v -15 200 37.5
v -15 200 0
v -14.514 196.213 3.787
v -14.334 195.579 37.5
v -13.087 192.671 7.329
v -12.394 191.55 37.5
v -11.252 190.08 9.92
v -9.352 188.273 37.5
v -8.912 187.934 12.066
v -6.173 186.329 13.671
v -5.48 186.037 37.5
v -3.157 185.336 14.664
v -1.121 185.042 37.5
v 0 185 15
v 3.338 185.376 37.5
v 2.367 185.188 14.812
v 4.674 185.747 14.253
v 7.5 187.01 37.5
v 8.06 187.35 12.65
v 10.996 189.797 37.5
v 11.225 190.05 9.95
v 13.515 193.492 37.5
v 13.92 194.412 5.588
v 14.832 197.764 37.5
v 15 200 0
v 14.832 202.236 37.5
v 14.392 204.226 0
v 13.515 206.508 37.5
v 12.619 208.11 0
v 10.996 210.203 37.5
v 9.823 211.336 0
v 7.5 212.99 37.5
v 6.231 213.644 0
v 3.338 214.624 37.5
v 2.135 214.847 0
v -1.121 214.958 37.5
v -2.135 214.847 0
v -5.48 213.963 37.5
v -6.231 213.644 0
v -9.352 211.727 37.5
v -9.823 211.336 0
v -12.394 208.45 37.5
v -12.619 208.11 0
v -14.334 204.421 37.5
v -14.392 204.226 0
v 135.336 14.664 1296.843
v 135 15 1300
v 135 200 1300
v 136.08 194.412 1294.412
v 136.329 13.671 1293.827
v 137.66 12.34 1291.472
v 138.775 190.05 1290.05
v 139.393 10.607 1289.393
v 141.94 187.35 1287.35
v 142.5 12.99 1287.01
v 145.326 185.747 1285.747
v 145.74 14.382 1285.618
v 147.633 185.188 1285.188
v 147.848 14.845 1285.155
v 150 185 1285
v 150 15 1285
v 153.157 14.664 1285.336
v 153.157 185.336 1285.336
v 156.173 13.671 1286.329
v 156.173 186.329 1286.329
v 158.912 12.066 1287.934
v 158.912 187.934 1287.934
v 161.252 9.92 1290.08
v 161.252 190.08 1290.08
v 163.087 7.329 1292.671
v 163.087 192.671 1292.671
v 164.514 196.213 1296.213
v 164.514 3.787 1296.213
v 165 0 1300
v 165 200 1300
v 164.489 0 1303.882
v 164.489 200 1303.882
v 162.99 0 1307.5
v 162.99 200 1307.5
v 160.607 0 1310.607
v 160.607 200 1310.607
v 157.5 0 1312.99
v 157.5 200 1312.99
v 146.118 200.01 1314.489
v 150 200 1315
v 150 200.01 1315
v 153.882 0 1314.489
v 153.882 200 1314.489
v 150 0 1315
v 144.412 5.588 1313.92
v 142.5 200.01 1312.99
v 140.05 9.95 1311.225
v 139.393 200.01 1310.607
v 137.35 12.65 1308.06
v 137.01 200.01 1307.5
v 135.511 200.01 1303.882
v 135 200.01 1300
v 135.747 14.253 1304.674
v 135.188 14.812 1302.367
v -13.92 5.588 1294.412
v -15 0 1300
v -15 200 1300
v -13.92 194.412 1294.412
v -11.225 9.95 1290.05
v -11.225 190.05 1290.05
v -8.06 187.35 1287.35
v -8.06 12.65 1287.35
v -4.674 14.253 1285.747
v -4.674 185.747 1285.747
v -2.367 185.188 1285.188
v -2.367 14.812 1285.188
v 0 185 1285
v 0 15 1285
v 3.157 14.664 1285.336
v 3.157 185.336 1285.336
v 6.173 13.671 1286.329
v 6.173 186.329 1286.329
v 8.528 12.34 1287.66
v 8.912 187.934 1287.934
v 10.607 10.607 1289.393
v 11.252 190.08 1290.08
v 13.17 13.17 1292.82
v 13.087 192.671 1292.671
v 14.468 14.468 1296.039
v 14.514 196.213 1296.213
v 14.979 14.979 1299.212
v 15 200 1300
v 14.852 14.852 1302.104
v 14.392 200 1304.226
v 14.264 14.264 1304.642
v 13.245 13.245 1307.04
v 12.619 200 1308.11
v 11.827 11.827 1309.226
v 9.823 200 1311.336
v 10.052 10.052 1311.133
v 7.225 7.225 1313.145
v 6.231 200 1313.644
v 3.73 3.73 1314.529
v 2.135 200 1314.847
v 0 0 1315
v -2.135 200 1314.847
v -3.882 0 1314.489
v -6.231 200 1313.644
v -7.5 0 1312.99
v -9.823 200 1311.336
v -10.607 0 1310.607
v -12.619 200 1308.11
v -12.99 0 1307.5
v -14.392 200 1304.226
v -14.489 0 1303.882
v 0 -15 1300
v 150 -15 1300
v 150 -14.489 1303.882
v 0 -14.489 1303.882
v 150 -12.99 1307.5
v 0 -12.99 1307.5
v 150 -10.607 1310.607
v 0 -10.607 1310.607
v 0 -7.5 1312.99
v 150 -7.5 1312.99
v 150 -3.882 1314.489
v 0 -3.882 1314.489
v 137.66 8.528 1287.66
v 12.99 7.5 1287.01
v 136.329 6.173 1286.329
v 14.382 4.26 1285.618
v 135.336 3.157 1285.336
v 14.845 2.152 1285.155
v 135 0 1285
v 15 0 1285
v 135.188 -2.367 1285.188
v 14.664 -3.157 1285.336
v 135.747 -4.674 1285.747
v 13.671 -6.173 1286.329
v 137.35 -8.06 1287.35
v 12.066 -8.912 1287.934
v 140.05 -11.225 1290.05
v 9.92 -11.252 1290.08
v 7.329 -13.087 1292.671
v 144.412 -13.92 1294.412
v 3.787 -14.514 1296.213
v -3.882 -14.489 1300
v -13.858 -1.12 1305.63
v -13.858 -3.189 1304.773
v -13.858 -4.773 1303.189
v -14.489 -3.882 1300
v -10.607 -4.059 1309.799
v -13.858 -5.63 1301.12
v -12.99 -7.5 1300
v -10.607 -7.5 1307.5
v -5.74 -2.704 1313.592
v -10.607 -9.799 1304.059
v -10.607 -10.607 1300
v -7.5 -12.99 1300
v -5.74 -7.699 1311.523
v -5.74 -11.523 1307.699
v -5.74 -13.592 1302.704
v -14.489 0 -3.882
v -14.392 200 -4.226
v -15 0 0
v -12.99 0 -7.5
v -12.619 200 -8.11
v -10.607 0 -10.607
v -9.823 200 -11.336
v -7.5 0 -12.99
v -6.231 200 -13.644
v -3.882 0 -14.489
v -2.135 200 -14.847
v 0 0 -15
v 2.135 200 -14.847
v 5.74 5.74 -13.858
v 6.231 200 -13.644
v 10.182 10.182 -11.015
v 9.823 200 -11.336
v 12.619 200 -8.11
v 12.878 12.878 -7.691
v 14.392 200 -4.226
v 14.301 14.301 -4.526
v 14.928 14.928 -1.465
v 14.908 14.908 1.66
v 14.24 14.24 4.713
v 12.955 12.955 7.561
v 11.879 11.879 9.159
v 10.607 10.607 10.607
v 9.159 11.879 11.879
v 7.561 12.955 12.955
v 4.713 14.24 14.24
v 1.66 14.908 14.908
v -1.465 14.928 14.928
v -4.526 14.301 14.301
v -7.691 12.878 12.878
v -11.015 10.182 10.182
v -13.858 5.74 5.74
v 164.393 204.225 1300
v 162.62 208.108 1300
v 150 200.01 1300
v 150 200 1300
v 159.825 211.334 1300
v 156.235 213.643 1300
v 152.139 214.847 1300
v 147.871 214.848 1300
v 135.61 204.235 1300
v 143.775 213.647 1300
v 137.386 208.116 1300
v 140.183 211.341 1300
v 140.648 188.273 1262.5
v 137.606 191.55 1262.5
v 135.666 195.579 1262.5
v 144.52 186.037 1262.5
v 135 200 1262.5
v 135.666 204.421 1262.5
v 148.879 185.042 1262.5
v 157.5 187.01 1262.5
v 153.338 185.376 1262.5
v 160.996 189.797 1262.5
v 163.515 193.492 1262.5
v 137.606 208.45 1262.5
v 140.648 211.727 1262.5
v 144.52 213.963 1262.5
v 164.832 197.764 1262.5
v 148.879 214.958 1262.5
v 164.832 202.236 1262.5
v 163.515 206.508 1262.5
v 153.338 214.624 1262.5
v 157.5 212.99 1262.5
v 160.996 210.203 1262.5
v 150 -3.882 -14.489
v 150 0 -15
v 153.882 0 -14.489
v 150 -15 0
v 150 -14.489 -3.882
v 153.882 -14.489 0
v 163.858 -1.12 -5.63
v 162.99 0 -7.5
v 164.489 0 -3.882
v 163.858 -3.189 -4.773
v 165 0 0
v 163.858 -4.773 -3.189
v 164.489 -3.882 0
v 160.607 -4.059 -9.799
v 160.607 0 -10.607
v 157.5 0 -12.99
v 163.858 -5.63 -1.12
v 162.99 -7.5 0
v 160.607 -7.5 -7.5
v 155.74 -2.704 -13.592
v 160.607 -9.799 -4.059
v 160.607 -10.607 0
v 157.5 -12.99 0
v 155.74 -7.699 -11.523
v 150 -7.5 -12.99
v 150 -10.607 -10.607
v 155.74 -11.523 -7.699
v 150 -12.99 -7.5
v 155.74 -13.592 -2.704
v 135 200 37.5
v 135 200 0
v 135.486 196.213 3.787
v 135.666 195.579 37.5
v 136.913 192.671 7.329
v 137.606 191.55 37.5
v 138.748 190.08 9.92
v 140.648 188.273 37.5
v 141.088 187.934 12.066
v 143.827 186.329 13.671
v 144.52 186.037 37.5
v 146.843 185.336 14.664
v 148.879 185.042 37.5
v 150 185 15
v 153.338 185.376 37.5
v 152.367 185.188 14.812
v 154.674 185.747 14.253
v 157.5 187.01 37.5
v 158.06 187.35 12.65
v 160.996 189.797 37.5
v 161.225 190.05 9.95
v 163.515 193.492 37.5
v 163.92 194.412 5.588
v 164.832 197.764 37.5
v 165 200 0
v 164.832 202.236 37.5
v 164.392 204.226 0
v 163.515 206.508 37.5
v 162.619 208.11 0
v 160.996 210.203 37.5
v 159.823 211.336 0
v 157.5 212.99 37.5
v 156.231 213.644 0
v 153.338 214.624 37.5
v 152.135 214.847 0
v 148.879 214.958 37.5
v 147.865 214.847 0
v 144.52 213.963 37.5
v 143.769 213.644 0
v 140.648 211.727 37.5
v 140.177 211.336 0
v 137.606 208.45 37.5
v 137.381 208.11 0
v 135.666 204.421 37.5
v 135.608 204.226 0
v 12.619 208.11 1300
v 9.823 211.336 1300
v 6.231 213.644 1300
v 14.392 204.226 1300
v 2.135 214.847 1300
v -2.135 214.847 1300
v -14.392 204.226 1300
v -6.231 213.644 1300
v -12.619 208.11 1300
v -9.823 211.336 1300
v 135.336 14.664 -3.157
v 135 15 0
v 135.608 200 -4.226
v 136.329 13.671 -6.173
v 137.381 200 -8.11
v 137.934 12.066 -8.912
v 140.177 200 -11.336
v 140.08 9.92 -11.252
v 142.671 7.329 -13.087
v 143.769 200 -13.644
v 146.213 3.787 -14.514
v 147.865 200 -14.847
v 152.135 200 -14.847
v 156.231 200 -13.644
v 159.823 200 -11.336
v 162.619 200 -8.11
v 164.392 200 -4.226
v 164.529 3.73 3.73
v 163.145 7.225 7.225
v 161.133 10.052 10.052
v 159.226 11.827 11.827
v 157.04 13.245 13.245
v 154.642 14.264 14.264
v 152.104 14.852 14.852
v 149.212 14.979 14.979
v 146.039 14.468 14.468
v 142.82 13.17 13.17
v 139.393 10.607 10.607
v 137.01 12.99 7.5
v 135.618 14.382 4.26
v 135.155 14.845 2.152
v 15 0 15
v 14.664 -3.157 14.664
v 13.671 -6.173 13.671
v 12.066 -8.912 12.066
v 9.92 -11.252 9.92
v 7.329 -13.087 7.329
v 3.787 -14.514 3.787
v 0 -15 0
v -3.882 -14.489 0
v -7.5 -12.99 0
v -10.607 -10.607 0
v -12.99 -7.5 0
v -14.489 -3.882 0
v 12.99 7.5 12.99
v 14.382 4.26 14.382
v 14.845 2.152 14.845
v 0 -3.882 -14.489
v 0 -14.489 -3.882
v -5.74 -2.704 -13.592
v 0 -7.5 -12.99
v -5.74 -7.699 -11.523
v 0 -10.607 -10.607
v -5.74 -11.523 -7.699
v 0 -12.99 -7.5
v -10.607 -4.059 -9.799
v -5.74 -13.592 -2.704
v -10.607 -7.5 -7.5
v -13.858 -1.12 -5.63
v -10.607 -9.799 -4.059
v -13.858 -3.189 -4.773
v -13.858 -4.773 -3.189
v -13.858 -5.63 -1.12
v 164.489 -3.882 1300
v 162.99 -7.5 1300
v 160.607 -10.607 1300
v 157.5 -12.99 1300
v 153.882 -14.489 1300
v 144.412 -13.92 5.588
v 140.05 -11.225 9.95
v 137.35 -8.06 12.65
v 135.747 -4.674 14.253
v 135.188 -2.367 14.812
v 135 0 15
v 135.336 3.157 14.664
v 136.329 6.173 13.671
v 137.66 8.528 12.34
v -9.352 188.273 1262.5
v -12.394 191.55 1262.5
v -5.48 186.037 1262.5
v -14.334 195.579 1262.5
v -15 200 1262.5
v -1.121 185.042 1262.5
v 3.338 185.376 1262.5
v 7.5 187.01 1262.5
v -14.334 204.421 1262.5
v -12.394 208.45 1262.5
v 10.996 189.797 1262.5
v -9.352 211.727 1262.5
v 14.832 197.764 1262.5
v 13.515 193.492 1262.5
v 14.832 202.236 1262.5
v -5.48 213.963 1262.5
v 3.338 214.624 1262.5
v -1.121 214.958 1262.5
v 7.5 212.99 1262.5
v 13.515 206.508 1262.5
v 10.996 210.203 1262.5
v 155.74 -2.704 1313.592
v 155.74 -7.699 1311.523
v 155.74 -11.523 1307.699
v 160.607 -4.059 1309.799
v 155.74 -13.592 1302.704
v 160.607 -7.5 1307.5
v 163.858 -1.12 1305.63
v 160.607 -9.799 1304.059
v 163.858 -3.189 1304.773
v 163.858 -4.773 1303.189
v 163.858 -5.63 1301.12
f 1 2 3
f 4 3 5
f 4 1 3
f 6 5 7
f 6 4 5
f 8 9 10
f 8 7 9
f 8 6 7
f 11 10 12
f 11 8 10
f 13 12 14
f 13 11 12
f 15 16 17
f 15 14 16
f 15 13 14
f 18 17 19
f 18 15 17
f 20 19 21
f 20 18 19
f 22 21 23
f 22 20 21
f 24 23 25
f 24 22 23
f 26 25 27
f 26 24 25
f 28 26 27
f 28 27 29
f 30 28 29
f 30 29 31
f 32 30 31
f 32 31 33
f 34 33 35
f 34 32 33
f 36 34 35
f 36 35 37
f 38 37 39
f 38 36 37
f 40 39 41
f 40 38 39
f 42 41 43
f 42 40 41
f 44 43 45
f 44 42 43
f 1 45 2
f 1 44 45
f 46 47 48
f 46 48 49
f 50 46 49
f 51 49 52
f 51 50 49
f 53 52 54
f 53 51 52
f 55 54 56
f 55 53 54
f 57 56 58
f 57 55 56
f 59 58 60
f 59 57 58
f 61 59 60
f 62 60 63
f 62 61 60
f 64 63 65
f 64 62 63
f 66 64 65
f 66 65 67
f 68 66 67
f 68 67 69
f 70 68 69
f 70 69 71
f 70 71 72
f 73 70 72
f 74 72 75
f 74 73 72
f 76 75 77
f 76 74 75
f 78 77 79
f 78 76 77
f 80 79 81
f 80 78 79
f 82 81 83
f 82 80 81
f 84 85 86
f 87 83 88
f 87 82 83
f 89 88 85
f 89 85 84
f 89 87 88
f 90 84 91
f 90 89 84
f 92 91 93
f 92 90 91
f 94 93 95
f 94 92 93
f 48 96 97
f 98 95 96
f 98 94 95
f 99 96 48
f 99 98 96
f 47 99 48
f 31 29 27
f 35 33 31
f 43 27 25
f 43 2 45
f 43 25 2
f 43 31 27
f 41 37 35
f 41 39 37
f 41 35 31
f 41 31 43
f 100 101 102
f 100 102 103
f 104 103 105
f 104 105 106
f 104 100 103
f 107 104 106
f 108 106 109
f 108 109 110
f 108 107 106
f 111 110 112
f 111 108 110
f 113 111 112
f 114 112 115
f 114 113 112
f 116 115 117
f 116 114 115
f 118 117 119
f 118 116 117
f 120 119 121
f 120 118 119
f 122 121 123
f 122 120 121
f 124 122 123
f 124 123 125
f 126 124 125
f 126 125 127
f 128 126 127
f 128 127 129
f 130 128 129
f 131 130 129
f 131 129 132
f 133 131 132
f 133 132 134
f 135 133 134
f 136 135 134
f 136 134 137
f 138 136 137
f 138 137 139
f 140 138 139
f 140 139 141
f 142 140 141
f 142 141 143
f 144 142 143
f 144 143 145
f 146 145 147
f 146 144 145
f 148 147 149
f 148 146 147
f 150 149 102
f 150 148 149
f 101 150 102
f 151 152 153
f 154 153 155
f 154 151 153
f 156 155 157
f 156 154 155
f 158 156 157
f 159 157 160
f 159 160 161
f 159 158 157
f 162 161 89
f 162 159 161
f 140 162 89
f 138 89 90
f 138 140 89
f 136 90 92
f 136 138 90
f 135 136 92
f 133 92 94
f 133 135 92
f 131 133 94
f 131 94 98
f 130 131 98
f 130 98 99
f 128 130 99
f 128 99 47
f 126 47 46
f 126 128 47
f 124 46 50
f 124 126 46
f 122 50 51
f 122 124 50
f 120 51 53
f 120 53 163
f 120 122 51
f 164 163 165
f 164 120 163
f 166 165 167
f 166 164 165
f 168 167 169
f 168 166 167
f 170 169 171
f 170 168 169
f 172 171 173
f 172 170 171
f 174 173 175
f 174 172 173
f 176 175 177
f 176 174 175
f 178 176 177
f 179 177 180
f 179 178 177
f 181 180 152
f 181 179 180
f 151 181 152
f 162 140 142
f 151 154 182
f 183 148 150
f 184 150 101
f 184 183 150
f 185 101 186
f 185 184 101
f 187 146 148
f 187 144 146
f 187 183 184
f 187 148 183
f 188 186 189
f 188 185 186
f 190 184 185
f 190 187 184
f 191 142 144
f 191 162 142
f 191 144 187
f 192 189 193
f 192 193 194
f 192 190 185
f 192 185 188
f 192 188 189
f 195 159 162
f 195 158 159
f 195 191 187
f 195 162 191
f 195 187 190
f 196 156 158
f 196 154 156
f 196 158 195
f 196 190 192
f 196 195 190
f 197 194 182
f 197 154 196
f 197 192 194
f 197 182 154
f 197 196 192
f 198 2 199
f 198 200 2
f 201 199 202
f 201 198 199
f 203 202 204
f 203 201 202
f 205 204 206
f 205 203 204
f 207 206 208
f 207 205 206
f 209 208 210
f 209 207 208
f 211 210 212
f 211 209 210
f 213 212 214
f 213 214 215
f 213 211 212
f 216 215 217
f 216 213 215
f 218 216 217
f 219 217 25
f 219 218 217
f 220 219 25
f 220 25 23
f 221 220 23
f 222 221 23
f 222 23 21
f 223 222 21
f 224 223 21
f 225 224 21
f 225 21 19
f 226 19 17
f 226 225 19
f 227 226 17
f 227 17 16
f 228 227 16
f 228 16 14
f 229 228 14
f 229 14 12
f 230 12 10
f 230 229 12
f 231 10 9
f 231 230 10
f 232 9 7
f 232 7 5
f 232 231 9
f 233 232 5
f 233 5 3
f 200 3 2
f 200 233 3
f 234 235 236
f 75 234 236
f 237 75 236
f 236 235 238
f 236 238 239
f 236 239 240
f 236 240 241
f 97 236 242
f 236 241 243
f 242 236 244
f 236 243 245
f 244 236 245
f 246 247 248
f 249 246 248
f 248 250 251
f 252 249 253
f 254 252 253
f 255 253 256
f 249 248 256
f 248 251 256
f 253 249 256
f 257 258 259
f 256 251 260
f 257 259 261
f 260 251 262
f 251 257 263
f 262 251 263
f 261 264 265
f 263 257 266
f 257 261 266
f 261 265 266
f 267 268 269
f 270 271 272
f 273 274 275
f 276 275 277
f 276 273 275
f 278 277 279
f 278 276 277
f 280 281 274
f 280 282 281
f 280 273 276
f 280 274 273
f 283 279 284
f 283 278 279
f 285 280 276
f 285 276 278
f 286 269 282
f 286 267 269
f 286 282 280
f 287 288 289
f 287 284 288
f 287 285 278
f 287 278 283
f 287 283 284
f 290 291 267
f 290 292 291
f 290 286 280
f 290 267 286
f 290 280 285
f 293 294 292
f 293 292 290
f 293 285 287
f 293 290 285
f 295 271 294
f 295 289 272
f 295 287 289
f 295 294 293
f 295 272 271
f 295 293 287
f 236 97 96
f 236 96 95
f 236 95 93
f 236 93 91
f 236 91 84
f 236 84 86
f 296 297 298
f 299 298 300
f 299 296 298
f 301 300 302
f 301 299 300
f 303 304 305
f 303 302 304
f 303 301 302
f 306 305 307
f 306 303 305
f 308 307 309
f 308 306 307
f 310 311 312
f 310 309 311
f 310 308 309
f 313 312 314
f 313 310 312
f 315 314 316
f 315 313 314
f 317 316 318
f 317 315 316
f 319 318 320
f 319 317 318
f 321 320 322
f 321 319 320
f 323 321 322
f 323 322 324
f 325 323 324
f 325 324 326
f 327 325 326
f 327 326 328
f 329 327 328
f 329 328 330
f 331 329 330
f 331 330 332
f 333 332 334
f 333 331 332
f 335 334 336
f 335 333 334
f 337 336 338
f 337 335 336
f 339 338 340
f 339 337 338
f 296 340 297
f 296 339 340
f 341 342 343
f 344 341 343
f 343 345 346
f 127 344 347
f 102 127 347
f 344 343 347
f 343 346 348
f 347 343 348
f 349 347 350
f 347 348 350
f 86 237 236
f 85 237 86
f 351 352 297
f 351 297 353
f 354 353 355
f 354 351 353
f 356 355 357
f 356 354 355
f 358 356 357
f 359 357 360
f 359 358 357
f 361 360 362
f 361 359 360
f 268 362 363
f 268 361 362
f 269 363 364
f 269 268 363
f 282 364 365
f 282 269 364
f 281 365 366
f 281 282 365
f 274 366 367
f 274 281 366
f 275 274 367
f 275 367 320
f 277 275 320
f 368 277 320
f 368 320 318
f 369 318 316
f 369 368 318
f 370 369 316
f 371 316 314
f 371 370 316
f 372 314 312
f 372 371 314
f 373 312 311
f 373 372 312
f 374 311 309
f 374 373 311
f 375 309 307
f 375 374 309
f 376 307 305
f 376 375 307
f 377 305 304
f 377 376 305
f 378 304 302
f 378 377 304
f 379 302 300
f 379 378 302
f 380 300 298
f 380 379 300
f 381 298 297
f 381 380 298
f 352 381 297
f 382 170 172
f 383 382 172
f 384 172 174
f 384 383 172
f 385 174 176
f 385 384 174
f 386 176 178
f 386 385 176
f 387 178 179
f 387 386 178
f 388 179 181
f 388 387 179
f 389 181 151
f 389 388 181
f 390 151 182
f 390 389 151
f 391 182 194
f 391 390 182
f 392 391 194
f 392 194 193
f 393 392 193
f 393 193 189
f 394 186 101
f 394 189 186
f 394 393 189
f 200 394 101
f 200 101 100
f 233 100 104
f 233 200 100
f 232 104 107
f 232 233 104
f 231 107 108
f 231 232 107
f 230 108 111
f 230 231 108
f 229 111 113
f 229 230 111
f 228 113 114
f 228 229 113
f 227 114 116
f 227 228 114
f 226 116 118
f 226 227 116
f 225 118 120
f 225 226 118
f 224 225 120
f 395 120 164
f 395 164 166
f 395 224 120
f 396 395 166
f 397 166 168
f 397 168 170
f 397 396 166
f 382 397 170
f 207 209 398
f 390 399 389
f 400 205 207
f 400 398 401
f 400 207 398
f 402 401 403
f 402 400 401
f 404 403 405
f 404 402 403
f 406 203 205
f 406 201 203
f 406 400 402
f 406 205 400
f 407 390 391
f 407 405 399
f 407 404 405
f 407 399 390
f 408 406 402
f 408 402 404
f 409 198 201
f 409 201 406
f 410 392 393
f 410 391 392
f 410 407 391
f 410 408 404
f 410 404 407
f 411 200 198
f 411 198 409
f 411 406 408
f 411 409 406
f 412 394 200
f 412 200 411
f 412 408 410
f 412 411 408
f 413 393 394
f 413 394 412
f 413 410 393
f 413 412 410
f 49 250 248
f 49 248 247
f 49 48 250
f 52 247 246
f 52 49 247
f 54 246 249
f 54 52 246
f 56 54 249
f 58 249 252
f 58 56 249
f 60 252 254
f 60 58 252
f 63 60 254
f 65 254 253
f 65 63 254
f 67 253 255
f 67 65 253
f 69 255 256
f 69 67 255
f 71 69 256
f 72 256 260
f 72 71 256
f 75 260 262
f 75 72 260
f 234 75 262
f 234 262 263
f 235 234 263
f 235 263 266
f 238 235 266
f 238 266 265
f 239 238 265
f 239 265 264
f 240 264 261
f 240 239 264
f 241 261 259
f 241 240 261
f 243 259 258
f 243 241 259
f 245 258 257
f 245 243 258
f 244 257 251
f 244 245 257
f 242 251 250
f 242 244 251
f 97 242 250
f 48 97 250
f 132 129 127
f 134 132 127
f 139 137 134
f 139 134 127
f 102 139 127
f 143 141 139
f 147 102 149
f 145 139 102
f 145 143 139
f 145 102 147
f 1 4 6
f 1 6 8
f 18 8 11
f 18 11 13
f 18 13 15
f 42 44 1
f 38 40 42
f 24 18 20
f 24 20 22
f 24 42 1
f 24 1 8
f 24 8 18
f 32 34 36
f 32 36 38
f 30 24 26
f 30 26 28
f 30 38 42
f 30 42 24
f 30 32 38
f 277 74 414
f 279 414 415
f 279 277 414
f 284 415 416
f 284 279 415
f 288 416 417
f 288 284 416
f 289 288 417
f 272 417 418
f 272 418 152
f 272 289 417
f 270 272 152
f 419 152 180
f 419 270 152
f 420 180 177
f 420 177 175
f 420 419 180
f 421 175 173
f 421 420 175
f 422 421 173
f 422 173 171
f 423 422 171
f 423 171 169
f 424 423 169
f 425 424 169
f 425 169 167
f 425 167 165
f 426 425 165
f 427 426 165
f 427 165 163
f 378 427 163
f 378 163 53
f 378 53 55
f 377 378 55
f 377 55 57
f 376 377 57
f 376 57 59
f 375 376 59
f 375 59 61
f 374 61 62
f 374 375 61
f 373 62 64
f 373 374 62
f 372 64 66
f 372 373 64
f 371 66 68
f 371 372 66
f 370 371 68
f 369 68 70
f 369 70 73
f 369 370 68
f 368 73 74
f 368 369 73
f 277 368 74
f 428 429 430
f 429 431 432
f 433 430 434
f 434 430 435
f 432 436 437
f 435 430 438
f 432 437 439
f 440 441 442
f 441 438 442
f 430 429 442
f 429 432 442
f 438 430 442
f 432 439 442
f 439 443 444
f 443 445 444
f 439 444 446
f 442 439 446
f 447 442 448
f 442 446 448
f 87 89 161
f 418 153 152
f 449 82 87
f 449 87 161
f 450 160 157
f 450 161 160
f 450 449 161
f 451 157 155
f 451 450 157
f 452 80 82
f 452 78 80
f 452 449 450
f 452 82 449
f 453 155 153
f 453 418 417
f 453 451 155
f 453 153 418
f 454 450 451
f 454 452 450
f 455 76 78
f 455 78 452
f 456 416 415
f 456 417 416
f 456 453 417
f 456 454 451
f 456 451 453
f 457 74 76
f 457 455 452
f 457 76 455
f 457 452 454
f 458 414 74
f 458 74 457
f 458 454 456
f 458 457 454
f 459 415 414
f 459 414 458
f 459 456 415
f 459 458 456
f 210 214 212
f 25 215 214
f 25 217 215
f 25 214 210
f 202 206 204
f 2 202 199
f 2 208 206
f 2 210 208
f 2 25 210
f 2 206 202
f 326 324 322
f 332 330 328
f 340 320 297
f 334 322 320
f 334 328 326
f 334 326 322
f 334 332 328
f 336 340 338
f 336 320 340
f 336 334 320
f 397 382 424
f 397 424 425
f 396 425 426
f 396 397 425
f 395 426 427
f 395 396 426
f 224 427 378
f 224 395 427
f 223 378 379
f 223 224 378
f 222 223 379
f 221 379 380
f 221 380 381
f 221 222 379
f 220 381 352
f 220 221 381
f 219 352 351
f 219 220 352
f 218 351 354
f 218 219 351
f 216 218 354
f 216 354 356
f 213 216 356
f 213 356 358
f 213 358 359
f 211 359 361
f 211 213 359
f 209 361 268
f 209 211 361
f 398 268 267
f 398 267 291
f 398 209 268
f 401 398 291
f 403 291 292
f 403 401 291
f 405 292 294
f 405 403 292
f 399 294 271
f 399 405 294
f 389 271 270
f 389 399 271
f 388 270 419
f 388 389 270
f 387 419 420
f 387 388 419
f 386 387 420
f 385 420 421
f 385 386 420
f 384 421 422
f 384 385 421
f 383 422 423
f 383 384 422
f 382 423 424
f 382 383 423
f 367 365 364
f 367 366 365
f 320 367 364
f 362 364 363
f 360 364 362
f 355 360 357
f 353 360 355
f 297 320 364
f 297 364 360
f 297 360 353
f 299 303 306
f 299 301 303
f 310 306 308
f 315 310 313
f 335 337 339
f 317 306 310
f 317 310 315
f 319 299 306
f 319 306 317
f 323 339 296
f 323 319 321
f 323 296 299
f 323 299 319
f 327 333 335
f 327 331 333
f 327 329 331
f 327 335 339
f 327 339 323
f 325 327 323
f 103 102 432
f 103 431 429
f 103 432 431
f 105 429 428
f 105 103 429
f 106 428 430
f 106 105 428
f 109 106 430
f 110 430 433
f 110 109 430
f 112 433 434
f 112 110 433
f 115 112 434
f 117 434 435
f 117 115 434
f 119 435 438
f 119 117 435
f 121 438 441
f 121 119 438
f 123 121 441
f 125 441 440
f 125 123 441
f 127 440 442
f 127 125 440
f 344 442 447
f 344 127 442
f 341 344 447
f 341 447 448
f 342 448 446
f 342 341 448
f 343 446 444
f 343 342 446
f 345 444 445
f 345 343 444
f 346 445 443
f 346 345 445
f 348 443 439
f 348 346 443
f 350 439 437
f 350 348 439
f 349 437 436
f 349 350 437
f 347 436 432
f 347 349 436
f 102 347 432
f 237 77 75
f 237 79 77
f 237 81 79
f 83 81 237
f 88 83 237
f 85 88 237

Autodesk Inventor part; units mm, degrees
sketch "Sketch1" plane through (0, 0, 0) normal (0, 0, 1) x (1, 0, 0)
  circle A0 centre (0, 0) radius 15
  circle A1 centre (150, 0) radius 15
  line L0 (0, 0) -> (150, 0)
  dimension "d0" = 30
  dimension "d3" = 30
  dimension "d4" = 150
extrude "Extrusion1" add sketch "Sketch1" along normal blind 1300
sketch "Sketch2" plane through (0, 0, 0) normal (0, 1, 0) x (-1, 0, 0)
  line L0 (15, 1300) -> (-15, 1300) projected
  line L1 (-15, 0) -> (15, 0) projected
  line L2 (-135, 1300) -> (-165, 1300) projected
  line L3 (-165, 0) -> (-135, 0) projected
  circle A0 centre (0, 0) radius 15
  line L4 (-165, 0) -> (-135, 0) projected
  circle A1 centre (-150, 0) radius 15
  line L5 (15, 1300) -> (-15, 1300) projected
  circle A2 centre (0, 1300) radius 15
  line L6 (-135, 1300) -> (-165, 1300) projected
  circle A3 centre (-150, 1300) radius 15
extrude "Extrusion2" add sketch "Sketch2" along normal blind 200
sketch "Sketch3" plane through (0, 0, 1300) normal (0, 0, 1) x (1, 0, 0)
  line L0 (135, 0) -> (165, 0) projected
  line L1 (165, 0) -> (135, 0) projected
  arc A0 (135, 0) -> (165, 0) centre (150, 0) ccw projected
  line L2 (15, 0) -> (-15, 0) projected
  arc A1 (-15, 0) -> (15, 0) centre (0, 0) ccw projected
  circle A2 centre (150, 0) radius 15
  line L3 (165, 0) -> (135, 0)
  circle A3 centre (0, 0) radius 15
  line L4 (15, 0) -> (-15, 0)
revolve "Revolution1" add sketch "Sketch3" angle 90 about axis through (135, 0, 1300) along (-1, 0, 0) contours L0 A0 | A1 L2
sketch "Sketch4" plane through (0, 0, 0) normal (0, 0, -1) x (-1, 0, 0)
  line L0 (15, 0) -> (-15, 0) projected
  arc A0 (-15, 0) -> (15, 0) centre (0, 0) ccw projected
  line L1 (-135, 0) -> (-165, 0) projected
  arc A1 (-165, 0) -> (-135, 0) centre (-150, 0) ccw projected
  circle A2 centre (0, 0) radius 15
  circle A3 centre (-150, 0) radius 15
  line L2 (-165, 0) -> (-135, 0)
  line L3 (15, 0) -> (-15, 0)
revolve "Revolution2" add sketch "Sketch4" angle 90 about axis through (-15, 0, 0) along (1, 0, 0) contours A0 L0 | A1 L1
sketch "Sketch5" plane through (150, 200, 1300) normal (0, 1, 0) x (1, 0, 0)
  circle A0 centre (0, 0) radius 15 projected
  circle A1 centre (0, 0) radius 15
  line L0 (-15, 0) -> (0, 0)
  line L1 (0, 0) -> (0, -15)
  point P0 (-150, 1300)
  point P1 (15, 0)
extrude "Extrusion4" add sketch "Sketch5" along normal blind 0.01 contours L0 L1 A0 picked at (-1.1126, -9.8746)
ref_plane "Work Plane1" through (150, 200.01, 1300) normal (0, 0, -1) x (-1, 0, 0)
sketch "Sketch6" plane through (150, 200.01, 1300) normal (0, 0, -1) x (-1, 0, 0)
  line L0 (15, -0.01) -> (-15, -0.01) projected
  line L1 (165, -0.01) -> (135, -0.01) projected
  circle A0 centre (150, -0.01) radius 15
  circle A1 centre (0, -0.01) radius 15
  point P0 (150, -200.01)
extrude "Extrusion5" add sketch "Sketch6" along normal blind 1300
ref_plane "Work Plane2" through (150, 200.01, 650) normal (0, 0, 1) x (1, 0, 0)
sketch "Sketch7" plane through (150, 200.01, 650) normal (0, 0, 1) x (1, 0, 0)
  arc A0 (15, -0.01) -> (-15, -0.01) centre (0, -0.01) ccw projected
  arc A1 (-15, -0.01) -> (15, -0.01) centre (0, -0.01) ccw projected
  line L0 (15, -0.01) -> (-15, -0.01) projected
  arc A2 (15, -200.01) -> (-15, -200.01) centre (0, -200.01) ccw projected
  line L1 (-15, -200.01) -> (15, -200.01) projected
  circle A3 centre (0, -0.01) radius 15
  line L2 (-165, -0.01) -> (-135, -0.01) projected
  arc A4 (-135, -0.01) -> (-165, -0.01) centre (-150, -0.01) ccw projected
  arc A5 (-165, -0.01) -> (-135, -0.01) centre (-150, -0.01) ccw projected
  line L3 (-135, -0.01) -> (-165, -0.01) projected
  arc A6 (-135, -200.01) -> (-165, -200.01) centre (-150, -200.01) ccw projected
  line L4 (-165, -200.01) -> (-135, -200.01) projected
  circle A7 centre (-150, -0.01) radius 15
extrude "Extrusion6" cut sketch "Sketch7" along normal mid plane 1225 contours L0 A0 | A1 L0 | A4 L2 | L2 A5
ref_plane "Work Plane3" through (0, 0, -10) normal (-1, 0, 0) x (0, 0, 1)
sketch "Sketch8" plane through (0, 0, -10) normal (-1, 0, 0) x (0, 0, 1)
  line L0 (1310, 0) -> (1310, 0) projected
  line L1 (1310, 0) -> (1310, 0) projected
  line L2 (10, 0) -> (10, 0) projected
  line L3 (10, 0) -> (10, 0) projected
  line L4 (10, 200) -> (10, 200) projected
  line L5 (10, 200) -> (10, 200) projected
  line L6 (10, 0) -> (10, 0) projected
  line L7 (10, 0) -> (10, 0) projected
  line L8 (25, 15) -> (1295, 15) projected
  line L9 (10, -15) -> (1310, -15) projected
  line L10 (10, 0) -> (10, -15) projected
  line L11 (10, 0) -> (25, 15) projected
  line L12 (25, 15) -> (25, 185) projected
  line L13 (-5, 0) -> (-5, 200) projected
  line L14 (-5, 0) -> (10, 0) projected
  line L15 (1295, 15) -> (1310, 0) projected
  line L16 (1310, 0) -> (1325, 0) projected
  line L17 (1310, -15) -> (1310, 0) projected
  line L18 (1325, 0) -> (1325, 200) projected
  line L19 (1295, 15) -> (1295, 185) projected
  arc A0 (1310, -15) -> (1325, 0) centre (1310, 0) ccw projected
  line L20 (10, 0) -> (10, 0) projected
  line L21 (10, 0) -> (10, 0) projected
  arc A1 (-5, 0) -> (10, -15) centre (10, 0) ccw projected
  circle A2 centre (10, 0) radius 15
  circle A3 centre (1310, 0) radius 15
extrude "Extrusion7" add sketch "Sketch8" against normal blind 150 contours A2 L10 L11 | L11 L14 A2 | A3 L16 L15 | L15 L17 A3 | L10 A1 L14 | L16 A0 L17
properties part number "Y_Rail_Bridge-Rod-Rev1"
